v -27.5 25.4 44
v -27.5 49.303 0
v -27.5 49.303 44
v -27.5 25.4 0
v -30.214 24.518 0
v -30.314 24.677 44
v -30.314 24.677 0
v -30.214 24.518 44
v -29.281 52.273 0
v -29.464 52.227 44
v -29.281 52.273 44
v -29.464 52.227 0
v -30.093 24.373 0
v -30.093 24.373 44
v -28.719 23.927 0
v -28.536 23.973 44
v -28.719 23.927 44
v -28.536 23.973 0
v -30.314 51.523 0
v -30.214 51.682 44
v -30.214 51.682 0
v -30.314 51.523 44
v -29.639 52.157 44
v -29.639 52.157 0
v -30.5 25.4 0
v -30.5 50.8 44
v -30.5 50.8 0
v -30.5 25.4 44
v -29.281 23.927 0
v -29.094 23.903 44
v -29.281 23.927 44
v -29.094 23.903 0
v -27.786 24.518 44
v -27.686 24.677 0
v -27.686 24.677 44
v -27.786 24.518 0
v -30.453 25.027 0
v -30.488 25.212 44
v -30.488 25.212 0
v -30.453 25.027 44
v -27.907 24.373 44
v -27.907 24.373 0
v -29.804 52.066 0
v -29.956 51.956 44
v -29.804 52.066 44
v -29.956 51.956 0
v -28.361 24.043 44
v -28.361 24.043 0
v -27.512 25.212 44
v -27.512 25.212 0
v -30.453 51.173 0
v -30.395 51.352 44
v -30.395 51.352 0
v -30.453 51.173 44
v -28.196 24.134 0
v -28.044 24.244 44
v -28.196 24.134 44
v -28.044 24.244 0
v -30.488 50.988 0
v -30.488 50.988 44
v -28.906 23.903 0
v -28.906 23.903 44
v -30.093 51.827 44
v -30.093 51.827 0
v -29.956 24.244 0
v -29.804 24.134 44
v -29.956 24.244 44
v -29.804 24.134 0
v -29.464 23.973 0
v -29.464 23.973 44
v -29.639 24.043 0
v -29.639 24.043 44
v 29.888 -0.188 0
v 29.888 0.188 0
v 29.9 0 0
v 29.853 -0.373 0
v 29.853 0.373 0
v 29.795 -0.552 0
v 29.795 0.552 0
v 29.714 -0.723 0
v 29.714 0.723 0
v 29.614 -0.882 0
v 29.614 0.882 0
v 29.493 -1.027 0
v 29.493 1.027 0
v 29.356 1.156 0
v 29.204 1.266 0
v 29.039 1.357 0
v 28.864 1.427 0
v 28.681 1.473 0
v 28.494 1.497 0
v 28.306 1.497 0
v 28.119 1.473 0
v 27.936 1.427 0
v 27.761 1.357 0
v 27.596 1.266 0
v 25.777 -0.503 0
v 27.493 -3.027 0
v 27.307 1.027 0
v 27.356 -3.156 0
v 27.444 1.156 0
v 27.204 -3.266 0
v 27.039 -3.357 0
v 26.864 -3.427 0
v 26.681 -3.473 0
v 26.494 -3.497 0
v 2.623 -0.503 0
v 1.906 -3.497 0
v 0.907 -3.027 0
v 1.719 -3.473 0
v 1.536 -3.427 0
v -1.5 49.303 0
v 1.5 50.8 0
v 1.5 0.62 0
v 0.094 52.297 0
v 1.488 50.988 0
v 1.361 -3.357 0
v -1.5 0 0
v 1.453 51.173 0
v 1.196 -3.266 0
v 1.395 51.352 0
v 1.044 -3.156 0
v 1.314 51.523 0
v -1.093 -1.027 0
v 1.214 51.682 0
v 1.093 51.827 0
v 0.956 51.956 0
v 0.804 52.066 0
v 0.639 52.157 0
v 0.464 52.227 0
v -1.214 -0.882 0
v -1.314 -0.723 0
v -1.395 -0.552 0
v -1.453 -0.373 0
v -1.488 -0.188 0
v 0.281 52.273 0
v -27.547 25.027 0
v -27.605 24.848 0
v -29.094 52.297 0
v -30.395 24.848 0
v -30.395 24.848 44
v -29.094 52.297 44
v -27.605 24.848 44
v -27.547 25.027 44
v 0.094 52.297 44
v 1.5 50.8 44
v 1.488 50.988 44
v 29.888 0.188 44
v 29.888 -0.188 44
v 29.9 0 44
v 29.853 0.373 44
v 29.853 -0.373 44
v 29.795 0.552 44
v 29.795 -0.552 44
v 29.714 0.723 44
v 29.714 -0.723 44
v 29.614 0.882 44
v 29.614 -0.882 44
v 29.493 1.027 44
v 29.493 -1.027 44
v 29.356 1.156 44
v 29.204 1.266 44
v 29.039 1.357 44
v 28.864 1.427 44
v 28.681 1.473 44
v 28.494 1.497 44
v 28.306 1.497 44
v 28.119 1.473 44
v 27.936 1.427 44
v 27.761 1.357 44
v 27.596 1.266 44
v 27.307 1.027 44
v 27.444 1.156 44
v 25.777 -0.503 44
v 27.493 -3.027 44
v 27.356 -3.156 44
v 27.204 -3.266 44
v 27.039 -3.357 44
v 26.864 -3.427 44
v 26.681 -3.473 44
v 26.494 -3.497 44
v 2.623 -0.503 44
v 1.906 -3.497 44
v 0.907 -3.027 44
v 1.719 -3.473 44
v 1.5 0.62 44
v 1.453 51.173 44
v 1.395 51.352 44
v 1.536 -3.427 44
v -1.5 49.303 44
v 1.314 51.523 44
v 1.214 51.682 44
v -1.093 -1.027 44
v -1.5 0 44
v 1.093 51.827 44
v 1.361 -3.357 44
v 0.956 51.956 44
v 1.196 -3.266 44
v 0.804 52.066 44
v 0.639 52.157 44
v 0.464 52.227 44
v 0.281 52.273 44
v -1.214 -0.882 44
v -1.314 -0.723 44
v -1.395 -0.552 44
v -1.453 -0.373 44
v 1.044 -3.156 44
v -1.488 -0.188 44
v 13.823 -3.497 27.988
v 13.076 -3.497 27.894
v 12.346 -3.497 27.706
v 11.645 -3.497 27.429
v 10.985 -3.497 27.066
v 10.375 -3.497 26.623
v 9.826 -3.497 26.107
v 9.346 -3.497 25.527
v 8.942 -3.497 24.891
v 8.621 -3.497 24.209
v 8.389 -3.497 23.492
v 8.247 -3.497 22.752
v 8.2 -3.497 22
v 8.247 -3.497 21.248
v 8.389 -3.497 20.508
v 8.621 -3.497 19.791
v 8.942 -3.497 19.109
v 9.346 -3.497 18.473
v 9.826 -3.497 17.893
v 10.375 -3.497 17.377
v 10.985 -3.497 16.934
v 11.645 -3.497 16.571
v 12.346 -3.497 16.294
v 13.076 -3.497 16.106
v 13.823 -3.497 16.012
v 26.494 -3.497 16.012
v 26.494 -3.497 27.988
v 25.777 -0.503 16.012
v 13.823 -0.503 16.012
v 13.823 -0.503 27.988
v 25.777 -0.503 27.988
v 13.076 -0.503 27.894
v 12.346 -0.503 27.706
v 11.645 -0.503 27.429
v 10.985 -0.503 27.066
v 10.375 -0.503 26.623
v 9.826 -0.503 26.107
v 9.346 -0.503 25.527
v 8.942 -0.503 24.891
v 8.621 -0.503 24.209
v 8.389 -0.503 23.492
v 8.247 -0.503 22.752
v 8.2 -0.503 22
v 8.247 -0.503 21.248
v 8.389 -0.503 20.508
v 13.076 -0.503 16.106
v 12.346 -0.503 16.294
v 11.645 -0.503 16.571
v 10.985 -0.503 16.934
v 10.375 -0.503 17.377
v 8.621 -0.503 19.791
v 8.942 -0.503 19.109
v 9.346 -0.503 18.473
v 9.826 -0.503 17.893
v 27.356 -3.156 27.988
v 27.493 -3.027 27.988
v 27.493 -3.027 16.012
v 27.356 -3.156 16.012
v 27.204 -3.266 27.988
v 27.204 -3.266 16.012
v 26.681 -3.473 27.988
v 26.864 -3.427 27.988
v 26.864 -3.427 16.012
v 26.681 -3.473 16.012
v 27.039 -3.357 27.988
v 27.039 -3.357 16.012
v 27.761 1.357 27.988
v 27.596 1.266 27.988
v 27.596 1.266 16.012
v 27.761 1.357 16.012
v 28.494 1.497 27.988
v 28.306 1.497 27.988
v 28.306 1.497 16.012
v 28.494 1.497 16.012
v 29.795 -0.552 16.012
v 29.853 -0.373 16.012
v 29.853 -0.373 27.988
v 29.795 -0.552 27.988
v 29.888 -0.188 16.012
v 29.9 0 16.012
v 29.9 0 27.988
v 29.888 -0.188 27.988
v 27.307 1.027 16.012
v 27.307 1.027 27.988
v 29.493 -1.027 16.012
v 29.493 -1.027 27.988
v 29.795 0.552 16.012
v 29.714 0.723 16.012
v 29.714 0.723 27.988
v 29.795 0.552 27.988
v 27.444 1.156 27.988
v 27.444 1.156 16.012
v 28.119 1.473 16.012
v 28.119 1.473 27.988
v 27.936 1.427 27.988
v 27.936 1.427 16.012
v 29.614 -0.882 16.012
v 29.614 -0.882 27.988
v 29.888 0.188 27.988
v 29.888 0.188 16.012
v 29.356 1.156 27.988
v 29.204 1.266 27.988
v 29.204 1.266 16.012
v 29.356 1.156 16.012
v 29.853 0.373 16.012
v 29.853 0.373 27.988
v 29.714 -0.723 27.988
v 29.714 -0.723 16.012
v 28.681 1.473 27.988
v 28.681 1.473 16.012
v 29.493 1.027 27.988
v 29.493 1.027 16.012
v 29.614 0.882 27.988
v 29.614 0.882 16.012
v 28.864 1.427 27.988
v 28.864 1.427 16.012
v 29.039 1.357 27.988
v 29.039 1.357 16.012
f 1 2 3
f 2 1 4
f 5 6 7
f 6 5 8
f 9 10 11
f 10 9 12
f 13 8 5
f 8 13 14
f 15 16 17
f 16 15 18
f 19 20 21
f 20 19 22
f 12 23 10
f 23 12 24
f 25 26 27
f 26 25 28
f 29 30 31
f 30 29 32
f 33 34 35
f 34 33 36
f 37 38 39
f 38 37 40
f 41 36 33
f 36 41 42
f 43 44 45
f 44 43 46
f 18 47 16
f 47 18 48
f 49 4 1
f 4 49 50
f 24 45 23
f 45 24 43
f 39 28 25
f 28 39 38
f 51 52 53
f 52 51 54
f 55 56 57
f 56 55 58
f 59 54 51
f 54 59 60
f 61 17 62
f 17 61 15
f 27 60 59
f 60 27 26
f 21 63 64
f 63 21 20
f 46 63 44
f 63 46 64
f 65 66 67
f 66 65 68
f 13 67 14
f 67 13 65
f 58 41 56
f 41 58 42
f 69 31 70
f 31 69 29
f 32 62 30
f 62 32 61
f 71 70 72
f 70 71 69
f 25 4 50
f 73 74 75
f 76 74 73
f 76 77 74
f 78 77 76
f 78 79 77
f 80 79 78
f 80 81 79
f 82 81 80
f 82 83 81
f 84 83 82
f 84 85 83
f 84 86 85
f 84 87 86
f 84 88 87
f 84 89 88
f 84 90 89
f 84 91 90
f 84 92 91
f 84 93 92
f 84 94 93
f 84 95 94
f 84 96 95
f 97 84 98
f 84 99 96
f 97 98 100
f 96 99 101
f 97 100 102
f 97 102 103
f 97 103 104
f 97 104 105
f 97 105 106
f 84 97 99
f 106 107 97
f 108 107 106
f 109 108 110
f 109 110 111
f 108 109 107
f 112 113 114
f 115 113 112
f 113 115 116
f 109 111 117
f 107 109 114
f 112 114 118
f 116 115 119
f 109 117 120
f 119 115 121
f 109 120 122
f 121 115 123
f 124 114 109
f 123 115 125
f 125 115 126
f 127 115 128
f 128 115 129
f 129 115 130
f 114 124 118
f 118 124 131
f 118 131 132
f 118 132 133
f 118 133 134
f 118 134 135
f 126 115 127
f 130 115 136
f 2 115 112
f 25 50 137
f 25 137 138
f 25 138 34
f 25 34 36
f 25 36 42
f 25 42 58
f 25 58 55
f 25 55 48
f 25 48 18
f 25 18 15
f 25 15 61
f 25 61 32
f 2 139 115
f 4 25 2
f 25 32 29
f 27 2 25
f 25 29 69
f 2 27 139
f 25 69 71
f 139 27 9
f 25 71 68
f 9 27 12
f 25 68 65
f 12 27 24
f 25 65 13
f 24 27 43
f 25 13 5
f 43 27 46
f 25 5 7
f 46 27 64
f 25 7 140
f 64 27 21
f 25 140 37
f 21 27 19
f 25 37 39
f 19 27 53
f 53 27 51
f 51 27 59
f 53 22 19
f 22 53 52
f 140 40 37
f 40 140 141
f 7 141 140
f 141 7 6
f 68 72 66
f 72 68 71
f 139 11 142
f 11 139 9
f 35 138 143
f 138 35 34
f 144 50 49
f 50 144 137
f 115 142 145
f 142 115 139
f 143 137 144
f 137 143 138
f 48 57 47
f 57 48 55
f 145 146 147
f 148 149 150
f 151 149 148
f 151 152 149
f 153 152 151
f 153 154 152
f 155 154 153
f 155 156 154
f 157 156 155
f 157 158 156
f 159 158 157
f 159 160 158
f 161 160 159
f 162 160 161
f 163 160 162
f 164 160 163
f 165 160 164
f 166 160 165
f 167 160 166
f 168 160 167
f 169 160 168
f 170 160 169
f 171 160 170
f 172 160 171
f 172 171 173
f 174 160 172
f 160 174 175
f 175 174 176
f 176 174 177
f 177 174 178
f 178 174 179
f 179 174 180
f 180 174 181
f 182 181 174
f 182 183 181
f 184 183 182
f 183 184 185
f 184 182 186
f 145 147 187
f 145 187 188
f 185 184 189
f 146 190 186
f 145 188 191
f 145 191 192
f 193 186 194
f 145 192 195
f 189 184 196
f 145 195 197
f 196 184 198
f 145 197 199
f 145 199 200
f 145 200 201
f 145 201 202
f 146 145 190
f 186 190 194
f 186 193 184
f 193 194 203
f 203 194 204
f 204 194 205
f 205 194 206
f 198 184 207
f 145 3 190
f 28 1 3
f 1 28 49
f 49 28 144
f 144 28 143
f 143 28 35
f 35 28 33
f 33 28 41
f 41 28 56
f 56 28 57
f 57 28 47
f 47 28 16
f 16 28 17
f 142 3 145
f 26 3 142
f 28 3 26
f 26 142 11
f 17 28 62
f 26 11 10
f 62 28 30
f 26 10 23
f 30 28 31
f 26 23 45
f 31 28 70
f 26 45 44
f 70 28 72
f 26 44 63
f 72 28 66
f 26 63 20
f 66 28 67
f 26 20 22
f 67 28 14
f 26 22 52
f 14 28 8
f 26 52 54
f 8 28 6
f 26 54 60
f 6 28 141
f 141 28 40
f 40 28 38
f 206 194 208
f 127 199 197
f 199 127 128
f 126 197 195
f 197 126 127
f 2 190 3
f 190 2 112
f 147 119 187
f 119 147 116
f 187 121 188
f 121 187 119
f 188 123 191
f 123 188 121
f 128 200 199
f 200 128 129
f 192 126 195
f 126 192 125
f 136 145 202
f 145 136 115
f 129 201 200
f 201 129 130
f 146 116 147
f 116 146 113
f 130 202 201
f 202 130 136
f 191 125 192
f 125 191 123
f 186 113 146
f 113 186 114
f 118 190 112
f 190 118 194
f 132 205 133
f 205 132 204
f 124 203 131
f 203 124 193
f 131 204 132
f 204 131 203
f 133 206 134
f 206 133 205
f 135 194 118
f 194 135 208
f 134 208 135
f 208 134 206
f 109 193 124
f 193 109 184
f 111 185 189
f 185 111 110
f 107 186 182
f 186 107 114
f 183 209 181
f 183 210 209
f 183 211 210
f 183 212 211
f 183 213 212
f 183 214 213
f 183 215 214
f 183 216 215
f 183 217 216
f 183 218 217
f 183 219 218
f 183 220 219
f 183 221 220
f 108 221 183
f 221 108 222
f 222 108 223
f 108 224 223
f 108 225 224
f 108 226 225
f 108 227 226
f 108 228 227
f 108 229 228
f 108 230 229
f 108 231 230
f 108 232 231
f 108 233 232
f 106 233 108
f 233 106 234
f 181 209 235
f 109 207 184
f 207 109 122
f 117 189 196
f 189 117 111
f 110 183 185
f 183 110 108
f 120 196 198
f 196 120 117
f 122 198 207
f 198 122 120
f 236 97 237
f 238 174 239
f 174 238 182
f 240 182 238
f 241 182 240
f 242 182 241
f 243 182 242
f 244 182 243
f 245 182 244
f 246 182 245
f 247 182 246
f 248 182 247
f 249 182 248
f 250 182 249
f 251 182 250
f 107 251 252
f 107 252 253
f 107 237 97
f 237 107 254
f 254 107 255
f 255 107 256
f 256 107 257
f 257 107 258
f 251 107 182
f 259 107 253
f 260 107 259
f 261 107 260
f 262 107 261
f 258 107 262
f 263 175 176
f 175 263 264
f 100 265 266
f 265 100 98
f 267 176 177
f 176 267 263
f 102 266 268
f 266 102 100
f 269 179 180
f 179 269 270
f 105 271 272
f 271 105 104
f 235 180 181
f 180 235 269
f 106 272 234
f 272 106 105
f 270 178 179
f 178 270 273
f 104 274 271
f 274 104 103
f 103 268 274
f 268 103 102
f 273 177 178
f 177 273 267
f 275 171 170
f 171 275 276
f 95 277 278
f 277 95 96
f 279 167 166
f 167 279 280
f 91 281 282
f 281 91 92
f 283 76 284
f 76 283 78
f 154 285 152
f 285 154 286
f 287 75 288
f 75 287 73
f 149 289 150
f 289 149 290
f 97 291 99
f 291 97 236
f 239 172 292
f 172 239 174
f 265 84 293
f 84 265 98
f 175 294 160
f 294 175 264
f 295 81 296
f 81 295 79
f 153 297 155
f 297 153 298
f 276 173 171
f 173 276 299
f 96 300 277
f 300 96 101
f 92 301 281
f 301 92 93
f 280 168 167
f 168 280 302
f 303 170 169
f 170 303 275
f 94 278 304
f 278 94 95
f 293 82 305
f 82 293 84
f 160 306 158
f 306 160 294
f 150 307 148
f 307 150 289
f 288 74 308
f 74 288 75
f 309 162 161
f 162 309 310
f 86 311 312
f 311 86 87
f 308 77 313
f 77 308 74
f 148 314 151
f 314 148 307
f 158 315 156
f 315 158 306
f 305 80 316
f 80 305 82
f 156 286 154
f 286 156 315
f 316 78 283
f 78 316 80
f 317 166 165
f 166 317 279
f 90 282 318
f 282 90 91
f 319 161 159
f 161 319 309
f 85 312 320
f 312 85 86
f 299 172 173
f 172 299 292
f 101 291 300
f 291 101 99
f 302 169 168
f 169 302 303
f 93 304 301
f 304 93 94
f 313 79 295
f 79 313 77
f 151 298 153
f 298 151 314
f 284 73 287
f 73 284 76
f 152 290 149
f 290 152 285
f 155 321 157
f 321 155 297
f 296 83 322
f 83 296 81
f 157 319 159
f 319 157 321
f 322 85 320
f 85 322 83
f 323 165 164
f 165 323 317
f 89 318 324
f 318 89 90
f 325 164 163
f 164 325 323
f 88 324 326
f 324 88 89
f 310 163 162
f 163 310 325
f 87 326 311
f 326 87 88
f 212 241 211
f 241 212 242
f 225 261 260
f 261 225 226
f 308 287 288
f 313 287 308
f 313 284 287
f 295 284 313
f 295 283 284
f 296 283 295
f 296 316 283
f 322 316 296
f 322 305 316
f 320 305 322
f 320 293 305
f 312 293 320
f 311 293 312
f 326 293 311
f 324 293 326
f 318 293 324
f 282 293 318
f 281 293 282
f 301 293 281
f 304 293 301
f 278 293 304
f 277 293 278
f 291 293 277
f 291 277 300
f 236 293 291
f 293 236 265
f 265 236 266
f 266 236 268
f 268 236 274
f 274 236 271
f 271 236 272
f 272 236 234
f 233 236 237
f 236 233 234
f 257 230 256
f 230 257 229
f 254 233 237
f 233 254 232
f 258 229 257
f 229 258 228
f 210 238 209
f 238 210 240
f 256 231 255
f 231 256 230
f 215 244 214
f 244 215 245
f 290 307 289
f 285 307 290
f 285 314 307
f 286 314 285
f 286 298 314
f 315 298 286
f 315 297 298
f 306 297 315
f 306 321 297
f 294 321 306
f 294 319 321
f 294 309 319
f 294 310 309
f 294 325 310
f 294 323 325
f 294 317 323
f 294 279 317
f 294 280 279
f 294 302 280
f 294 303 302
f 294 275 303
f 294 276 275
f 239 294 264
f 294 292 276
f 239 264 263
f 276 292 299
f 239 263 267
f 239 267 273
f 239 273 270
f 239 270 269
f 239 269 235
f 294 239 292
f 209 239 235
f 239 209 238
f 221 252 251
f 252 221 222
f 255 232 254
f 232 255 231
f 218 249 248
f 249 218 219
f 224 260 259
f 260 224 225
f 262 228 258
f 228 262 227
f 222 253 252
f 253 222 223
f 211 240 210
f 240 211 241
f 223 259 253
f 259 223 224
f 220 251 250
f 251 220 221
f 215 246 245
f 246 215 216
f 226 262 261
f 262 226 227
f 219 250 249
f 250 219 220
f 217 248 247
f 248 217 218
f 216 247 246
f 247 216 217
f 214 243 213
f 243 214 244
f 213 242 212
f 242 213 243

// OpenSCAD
// Parameterizable safety razor holder by Michael Gebis
// ivymike at gmail and twitter. I'd love to hear from you!

// To the extent possible under law, the author(s) have dedicated all
// copyright and related and neighboring rights to this software to the
// public domain worldwide. This software is distributed without any
// warranty. Use at your own risk!

// I ask but do not require that you credit me if you use or remix this. Thank you!

// Dimensions for the shower hanger
OVERHANG_MM     = 25.4; // The vertical part of the "hook"
MAIN_HANG_MM    = 50.8; // The other vertical part of the "hook"
SHOWER_WALL_MM  = 26.0; // How thick the shower wall is

// Dimensions for the razor holder. Fits most standard safety razors.
RAZOR_LENGTH_MM = 44.0;
RAZOR_WIDTH_MM  = 25.4;
HANDLE_DIA_MM   = 12.0;

// General parameters
THICKNESS_MM    = 3.0;
CHAMFER_MM      = 2.0;
$fn=50;

module rounded_wall(start_x, start_y, end_x, end_y, height, thickness) {
    hull() {
        translate([start_x, start_y, 0]) {
            cylinder(h=height, d=thickness);
        }
        translate([end_x, end_y, 0]) {
            cylinder(h=height, d=thickness);
        }
    }
}

module create_shower_hanger() {
    rounded_wall(-1*(SHOWER_WALL_MM+THICKNESS_MM), MAIN_HANG_MM - OVERHANG_MM,  -1*(SHOWER_WALL_MM+THICKNESS_MM), MAIN_HANG_MM, RAZOR_LENGTH_MM, THICKNESS_MM);
    rounded_wall(-1*(SHOWER_WALL_MM+THICKNESS_MM), MAIN_HANG_MM, 0, MAIN_HANG_MM, RAZOR_LENGTH_MM, THICKNESS_MM);
    rounded_wall(0, MAIN_HANG_MM, 0, 0, RAZOR_LENGTH_MM, THICKNESS_MM);
}

module create_razor_slot() {
    translate([(RAZOR_WIDTH_MM+THICKNESS_MM)/2, -1*(CHAMFER_MM+THICKNESS_MM)*2, RAZOR_LENGTH_MM/2]){
        rotate([-90,0,0]) {
            rounded_wall(0,0,(RAZOR_WIDTH_MM+THICKNESS_MM),0, RAZOR_WIDTH_MM, HANDLE_DIA_MM);
        }
    }
}

module create_razor_holder() {
    difference() {
        union() {
            rounded_wall(0,0, CHAMFER_MM, -1*CHAMFER_MM, RAZOR_LENGTH_MM, THICKNESS_MM);
            rounded_wall(CHAMFER_MM, -1*CHAMFER_MM, RAZOR_WIDTH_MM+THICKNESS_MM-CHAMFER_MM, -1*CHAMFER_MM, RAZOR_LENGTH_MM, THICKNESS_MM);
            rounded_wall(RAZOR_WIDTH_MM+THICKNESS_MM-CHAMFER_MM, -1*CHAMFER_MM, RAZOR_WIDTH_MM+THICKNESS_MM, 0, RAZOR_LENGTH_MM, THICKNESS_MM);
        }
        create_razor_slot();
   }
}

module main() {
    union() {
        create_shower_hanger();
        create_razor_holder();
    }
}

main();
